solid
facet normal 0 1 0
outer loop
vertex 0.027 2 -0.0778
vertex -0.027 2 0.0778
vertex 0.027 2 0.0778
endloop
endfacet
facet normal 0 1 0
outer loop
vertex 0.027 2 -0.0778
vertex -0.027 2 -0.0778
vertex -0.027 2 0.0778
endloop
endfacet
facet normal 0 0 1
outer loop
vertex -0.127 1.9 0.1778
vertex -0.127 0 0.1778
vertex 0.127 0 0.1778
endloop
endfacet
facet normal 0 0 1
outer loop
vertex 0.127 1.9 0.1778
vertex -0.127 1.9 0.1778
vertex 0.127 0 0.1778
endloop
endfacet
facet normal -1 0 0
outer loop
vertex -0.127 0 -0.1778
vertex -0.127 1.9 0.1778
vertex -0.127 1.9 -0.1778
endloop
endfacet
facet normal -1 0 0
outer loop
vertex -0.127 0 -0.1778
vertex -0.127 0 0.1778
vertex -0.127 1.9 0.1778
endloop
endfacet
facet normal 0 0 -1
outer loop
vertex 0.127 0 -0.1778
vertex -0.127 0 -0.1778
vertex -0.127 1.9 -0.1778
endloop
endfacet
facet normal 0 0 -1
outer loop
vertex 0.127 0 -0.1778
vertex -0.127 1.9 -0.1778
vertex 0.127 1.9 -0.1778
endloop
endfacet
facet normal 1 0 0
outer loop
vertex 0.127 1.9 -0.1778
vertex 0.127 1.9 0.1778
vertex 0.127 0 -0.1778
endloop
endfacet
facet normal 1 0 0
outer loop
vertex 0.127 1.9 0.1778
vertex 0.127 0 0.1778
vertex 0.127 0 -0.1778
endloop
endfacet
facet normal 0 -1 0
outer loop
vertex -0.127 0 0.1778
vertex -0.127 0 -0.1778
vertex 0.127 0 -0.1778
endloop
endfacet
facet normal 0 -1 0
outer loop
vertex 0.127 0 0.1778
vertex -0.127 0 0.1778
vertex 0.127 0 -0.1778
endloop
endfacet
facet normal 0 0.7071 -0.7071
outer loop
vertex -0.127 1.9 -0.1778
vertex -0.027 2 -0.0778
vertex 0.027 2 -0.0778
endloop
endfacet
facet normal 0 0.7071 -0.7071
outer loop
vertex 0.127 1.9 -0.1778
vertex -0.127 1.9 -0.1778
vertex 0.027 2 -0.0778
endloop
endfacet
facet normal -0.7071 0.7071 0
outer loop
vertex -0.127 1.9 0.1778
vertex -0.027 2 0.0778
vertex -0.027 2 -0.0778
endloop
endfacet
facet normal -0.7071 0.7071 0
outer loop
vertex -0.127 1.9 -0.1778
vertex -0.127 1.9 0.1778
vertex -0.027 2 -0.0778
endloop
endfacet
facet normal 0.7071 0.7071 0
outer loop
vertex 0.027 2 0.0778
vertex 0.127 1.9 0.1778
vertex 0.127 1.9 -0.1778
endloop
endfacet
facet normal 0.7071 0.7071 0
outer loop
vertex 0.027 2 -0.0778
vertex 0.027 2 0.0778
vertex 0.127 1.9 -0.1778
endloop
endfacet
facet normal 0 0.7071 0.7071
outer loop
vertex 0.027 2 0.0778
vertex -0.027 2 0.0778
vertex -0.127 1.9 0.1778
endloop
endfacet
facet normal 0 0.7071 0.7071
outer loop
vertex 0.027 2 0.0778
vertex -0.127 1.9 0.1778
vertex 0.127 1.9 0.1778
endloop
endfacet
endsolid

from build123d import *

# Parameters (mm, degrees)
SKETCH1_W           = 0.254
SKETCH1_H           = 0.3556
BOSS_EXTRUDE1_DEPTH = 2
CHAMFER1_SIZE       = 0.1
CHAMFER2_SIZE       = 0.1


with BuildPart() as part:
    # Sketch1 → Boss-Extrude1 (new body)
    with BuildSketch(Plane(origin=(0, 0, 0), x_dir=(1, 0, 0), z_dir=(0, 1, 0))):
        Rectangle(SKETCH1_W, SKETCH1_H)
    extrude(amount=BOSS_EXTRUDE1_DEPTH)

    # Chamfer1
    chamfer1_edges = [part.edges().sort_by_distance(p)[0] for p in [
        (0, 2, 0.1778),
        (0, 2, -0.1778),
    ]]
    chamfer(chamfer1_edges, length=CHAMFER1_SIZE)

    # Chamfer2
    chamfer2_edges = [part.edges().sort_by_distance(p)[0] for p in [
        (-0.127, 2, 0),
        (0.127, 2, 0),
    ]]
    chamfer(chamfer2_edges, length=CHAMFER2_SIZE)


solid = part.part
